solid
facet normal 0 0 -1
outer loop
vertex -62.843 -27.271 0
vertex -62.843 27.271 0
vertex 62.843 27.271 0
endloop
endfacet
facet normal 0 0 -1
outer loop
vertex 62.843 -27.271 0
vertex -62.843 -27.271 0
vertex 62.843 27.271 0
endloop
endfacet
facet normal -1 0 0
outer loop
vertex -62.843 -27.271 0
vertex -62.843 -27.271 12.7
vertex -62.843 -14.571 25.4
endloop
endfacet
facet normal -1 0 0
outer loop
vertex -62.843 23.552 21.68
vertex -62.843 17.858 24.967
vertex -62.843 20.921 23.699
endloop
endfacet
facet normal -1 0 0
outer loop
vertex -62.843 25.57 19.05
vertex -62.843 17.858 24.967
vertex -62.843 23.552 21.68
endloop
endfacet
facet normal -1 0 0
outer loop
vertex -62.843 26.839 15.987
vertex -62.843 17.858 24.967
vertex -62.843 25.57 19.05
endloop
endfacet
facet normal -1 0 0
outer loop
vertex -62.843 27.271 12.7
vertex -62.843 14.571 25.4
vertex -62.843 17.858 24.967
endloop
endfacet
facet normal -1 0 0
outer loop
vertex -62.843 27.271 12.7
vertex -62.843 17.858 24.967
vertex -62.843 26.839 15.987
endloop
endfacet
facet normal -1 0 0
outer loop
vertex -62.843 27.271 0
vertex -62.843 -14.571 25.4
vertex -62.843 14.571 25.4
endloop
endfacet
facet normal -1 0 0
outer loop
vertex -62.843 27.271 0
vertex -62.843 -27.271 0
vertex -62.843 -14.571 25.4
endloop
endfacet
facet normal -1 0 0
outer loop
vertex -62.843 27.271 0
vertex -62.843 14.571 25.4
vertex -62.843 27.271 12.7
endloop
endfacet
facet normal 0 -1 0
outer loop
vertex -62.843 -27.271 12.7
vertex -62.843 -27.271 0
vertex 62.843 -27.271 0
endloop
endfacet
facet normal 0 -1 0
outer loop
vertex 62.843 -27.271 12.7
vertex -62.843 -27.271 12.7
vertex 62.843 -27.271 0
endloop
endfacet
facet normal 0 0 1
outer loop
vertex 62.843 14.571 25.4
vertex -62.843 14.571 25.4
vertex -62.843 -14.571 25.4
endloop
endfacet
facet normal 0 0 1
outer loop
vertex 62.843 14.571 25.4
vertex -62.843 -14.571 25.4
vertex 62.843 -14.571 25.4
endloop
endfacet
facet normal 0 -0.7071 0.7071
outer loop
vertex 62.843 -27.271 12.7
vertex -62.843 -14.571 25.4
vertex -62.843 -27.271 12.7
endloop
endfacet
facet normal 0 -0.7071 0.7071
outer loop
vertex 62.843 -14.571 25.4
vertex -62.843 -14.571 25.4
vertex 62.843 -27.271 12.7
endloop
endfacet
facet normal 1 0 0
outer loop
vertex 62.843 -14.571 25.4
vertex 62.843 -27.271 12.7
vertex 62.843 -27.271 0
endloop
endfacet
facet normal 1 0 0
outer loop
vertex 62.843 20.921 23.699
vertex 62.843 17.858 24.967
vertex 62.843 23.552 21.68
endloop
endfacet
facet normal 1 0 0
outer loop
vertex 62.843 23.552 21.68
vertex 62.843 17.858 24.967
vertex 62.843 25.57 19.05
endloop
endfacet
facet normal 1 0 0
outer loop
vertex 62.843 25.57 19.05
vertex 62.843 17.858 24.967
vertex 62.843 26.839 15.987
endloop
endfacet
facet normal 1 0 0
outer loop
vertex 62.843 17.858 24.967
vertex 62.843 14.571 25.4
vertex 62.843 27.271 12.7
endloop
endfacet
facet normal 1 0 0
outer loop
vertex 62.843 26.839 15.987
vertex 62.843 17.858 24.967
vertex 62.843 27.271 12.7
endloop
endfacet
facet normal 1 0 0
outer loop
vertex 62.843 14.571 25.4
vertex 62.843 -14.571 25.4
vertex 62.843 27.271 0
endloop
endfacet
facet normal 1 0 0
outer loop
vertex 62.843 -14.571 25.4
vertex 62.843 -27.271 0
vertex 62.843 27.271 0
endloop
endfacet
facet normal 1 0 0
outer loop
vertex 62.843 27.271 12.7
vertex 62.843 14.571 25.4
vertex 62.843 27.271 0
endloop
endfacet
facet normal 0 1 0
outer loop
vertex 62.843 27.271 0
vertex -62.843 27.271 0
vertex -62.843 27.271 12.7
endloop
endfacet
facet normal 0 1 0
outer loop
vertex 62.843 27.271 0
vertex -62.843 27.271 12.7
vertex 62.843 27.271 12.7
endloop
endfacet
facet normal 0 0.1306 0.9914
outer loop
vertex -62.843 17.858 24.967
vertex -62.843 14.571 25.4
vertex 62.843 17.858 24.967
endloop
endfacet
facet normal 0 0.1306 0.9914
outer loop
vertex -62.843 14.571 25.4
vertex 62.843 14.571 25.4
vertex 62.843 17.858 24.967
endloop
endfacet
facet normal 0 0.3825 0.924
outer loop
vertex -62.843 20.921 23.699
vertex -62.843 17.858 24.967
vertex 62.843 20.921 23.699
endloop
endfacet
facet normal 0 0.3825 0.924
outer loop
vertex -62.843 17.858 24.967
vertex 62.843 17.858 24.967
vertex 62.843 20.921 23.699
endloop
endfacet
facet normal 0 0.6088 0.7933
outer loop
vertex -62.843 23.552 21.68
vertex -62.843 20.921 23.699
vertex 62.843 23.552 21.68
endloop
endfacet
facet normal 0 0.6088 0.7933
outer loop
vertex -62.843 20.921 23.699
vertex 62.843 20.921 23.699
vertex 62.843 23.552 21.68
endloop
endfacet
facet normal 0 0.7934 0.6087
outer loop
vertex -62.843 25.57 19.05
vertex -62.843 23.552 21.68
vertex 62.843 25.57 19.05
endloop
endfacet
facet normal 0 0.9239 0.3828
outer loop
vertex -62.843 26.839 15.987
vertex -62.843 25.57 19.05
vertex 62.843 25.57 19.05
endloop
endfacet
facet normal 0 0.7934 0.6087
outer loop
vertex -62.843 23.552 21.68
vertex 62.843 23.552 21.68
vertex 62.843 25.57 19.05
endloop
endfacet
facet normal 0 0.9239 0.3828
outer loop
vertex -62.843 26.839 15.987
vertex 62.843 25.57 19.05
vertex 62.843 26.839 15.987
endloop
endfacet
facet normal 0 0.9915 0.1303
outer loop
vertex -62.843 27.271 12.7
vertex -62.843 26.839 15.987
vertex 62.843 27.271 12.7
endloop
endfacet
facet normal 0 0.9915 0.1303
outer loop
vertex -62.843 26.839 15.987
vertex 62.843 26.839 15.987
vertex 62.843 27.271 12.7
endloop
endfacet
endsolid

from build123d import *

# Parameters (mm, degrees)
F0_W     = 125.685974
F0_H     = 54.542944
F1_DEPTH = 25.4
F2_SIZE  = 12.7
F3_R     = 12.7


with BuildPart() as f1:
    # F0 (on Top) → F1 (new body)
    with BuildSketch(Plane.XY):
        Rectangle(F0_W, F0_H)
    extrude(amount=F1_DEPTH)

    # F2
    f2_edges = [f1.edges().sort_by_distance(p)[0] for p in [
        (0, -27.271472, 25.4),
    ]]
    chamfer(f2_edges, length=F2_SIZE)

    # F3
    f3_edges = [f1.edges().sort_by_distance(p)[0] for p in [
        (0, 27.271472, 25.4),
    ]]
    fillet(f3_edges, radius=F3_R)


solid = f1.part
